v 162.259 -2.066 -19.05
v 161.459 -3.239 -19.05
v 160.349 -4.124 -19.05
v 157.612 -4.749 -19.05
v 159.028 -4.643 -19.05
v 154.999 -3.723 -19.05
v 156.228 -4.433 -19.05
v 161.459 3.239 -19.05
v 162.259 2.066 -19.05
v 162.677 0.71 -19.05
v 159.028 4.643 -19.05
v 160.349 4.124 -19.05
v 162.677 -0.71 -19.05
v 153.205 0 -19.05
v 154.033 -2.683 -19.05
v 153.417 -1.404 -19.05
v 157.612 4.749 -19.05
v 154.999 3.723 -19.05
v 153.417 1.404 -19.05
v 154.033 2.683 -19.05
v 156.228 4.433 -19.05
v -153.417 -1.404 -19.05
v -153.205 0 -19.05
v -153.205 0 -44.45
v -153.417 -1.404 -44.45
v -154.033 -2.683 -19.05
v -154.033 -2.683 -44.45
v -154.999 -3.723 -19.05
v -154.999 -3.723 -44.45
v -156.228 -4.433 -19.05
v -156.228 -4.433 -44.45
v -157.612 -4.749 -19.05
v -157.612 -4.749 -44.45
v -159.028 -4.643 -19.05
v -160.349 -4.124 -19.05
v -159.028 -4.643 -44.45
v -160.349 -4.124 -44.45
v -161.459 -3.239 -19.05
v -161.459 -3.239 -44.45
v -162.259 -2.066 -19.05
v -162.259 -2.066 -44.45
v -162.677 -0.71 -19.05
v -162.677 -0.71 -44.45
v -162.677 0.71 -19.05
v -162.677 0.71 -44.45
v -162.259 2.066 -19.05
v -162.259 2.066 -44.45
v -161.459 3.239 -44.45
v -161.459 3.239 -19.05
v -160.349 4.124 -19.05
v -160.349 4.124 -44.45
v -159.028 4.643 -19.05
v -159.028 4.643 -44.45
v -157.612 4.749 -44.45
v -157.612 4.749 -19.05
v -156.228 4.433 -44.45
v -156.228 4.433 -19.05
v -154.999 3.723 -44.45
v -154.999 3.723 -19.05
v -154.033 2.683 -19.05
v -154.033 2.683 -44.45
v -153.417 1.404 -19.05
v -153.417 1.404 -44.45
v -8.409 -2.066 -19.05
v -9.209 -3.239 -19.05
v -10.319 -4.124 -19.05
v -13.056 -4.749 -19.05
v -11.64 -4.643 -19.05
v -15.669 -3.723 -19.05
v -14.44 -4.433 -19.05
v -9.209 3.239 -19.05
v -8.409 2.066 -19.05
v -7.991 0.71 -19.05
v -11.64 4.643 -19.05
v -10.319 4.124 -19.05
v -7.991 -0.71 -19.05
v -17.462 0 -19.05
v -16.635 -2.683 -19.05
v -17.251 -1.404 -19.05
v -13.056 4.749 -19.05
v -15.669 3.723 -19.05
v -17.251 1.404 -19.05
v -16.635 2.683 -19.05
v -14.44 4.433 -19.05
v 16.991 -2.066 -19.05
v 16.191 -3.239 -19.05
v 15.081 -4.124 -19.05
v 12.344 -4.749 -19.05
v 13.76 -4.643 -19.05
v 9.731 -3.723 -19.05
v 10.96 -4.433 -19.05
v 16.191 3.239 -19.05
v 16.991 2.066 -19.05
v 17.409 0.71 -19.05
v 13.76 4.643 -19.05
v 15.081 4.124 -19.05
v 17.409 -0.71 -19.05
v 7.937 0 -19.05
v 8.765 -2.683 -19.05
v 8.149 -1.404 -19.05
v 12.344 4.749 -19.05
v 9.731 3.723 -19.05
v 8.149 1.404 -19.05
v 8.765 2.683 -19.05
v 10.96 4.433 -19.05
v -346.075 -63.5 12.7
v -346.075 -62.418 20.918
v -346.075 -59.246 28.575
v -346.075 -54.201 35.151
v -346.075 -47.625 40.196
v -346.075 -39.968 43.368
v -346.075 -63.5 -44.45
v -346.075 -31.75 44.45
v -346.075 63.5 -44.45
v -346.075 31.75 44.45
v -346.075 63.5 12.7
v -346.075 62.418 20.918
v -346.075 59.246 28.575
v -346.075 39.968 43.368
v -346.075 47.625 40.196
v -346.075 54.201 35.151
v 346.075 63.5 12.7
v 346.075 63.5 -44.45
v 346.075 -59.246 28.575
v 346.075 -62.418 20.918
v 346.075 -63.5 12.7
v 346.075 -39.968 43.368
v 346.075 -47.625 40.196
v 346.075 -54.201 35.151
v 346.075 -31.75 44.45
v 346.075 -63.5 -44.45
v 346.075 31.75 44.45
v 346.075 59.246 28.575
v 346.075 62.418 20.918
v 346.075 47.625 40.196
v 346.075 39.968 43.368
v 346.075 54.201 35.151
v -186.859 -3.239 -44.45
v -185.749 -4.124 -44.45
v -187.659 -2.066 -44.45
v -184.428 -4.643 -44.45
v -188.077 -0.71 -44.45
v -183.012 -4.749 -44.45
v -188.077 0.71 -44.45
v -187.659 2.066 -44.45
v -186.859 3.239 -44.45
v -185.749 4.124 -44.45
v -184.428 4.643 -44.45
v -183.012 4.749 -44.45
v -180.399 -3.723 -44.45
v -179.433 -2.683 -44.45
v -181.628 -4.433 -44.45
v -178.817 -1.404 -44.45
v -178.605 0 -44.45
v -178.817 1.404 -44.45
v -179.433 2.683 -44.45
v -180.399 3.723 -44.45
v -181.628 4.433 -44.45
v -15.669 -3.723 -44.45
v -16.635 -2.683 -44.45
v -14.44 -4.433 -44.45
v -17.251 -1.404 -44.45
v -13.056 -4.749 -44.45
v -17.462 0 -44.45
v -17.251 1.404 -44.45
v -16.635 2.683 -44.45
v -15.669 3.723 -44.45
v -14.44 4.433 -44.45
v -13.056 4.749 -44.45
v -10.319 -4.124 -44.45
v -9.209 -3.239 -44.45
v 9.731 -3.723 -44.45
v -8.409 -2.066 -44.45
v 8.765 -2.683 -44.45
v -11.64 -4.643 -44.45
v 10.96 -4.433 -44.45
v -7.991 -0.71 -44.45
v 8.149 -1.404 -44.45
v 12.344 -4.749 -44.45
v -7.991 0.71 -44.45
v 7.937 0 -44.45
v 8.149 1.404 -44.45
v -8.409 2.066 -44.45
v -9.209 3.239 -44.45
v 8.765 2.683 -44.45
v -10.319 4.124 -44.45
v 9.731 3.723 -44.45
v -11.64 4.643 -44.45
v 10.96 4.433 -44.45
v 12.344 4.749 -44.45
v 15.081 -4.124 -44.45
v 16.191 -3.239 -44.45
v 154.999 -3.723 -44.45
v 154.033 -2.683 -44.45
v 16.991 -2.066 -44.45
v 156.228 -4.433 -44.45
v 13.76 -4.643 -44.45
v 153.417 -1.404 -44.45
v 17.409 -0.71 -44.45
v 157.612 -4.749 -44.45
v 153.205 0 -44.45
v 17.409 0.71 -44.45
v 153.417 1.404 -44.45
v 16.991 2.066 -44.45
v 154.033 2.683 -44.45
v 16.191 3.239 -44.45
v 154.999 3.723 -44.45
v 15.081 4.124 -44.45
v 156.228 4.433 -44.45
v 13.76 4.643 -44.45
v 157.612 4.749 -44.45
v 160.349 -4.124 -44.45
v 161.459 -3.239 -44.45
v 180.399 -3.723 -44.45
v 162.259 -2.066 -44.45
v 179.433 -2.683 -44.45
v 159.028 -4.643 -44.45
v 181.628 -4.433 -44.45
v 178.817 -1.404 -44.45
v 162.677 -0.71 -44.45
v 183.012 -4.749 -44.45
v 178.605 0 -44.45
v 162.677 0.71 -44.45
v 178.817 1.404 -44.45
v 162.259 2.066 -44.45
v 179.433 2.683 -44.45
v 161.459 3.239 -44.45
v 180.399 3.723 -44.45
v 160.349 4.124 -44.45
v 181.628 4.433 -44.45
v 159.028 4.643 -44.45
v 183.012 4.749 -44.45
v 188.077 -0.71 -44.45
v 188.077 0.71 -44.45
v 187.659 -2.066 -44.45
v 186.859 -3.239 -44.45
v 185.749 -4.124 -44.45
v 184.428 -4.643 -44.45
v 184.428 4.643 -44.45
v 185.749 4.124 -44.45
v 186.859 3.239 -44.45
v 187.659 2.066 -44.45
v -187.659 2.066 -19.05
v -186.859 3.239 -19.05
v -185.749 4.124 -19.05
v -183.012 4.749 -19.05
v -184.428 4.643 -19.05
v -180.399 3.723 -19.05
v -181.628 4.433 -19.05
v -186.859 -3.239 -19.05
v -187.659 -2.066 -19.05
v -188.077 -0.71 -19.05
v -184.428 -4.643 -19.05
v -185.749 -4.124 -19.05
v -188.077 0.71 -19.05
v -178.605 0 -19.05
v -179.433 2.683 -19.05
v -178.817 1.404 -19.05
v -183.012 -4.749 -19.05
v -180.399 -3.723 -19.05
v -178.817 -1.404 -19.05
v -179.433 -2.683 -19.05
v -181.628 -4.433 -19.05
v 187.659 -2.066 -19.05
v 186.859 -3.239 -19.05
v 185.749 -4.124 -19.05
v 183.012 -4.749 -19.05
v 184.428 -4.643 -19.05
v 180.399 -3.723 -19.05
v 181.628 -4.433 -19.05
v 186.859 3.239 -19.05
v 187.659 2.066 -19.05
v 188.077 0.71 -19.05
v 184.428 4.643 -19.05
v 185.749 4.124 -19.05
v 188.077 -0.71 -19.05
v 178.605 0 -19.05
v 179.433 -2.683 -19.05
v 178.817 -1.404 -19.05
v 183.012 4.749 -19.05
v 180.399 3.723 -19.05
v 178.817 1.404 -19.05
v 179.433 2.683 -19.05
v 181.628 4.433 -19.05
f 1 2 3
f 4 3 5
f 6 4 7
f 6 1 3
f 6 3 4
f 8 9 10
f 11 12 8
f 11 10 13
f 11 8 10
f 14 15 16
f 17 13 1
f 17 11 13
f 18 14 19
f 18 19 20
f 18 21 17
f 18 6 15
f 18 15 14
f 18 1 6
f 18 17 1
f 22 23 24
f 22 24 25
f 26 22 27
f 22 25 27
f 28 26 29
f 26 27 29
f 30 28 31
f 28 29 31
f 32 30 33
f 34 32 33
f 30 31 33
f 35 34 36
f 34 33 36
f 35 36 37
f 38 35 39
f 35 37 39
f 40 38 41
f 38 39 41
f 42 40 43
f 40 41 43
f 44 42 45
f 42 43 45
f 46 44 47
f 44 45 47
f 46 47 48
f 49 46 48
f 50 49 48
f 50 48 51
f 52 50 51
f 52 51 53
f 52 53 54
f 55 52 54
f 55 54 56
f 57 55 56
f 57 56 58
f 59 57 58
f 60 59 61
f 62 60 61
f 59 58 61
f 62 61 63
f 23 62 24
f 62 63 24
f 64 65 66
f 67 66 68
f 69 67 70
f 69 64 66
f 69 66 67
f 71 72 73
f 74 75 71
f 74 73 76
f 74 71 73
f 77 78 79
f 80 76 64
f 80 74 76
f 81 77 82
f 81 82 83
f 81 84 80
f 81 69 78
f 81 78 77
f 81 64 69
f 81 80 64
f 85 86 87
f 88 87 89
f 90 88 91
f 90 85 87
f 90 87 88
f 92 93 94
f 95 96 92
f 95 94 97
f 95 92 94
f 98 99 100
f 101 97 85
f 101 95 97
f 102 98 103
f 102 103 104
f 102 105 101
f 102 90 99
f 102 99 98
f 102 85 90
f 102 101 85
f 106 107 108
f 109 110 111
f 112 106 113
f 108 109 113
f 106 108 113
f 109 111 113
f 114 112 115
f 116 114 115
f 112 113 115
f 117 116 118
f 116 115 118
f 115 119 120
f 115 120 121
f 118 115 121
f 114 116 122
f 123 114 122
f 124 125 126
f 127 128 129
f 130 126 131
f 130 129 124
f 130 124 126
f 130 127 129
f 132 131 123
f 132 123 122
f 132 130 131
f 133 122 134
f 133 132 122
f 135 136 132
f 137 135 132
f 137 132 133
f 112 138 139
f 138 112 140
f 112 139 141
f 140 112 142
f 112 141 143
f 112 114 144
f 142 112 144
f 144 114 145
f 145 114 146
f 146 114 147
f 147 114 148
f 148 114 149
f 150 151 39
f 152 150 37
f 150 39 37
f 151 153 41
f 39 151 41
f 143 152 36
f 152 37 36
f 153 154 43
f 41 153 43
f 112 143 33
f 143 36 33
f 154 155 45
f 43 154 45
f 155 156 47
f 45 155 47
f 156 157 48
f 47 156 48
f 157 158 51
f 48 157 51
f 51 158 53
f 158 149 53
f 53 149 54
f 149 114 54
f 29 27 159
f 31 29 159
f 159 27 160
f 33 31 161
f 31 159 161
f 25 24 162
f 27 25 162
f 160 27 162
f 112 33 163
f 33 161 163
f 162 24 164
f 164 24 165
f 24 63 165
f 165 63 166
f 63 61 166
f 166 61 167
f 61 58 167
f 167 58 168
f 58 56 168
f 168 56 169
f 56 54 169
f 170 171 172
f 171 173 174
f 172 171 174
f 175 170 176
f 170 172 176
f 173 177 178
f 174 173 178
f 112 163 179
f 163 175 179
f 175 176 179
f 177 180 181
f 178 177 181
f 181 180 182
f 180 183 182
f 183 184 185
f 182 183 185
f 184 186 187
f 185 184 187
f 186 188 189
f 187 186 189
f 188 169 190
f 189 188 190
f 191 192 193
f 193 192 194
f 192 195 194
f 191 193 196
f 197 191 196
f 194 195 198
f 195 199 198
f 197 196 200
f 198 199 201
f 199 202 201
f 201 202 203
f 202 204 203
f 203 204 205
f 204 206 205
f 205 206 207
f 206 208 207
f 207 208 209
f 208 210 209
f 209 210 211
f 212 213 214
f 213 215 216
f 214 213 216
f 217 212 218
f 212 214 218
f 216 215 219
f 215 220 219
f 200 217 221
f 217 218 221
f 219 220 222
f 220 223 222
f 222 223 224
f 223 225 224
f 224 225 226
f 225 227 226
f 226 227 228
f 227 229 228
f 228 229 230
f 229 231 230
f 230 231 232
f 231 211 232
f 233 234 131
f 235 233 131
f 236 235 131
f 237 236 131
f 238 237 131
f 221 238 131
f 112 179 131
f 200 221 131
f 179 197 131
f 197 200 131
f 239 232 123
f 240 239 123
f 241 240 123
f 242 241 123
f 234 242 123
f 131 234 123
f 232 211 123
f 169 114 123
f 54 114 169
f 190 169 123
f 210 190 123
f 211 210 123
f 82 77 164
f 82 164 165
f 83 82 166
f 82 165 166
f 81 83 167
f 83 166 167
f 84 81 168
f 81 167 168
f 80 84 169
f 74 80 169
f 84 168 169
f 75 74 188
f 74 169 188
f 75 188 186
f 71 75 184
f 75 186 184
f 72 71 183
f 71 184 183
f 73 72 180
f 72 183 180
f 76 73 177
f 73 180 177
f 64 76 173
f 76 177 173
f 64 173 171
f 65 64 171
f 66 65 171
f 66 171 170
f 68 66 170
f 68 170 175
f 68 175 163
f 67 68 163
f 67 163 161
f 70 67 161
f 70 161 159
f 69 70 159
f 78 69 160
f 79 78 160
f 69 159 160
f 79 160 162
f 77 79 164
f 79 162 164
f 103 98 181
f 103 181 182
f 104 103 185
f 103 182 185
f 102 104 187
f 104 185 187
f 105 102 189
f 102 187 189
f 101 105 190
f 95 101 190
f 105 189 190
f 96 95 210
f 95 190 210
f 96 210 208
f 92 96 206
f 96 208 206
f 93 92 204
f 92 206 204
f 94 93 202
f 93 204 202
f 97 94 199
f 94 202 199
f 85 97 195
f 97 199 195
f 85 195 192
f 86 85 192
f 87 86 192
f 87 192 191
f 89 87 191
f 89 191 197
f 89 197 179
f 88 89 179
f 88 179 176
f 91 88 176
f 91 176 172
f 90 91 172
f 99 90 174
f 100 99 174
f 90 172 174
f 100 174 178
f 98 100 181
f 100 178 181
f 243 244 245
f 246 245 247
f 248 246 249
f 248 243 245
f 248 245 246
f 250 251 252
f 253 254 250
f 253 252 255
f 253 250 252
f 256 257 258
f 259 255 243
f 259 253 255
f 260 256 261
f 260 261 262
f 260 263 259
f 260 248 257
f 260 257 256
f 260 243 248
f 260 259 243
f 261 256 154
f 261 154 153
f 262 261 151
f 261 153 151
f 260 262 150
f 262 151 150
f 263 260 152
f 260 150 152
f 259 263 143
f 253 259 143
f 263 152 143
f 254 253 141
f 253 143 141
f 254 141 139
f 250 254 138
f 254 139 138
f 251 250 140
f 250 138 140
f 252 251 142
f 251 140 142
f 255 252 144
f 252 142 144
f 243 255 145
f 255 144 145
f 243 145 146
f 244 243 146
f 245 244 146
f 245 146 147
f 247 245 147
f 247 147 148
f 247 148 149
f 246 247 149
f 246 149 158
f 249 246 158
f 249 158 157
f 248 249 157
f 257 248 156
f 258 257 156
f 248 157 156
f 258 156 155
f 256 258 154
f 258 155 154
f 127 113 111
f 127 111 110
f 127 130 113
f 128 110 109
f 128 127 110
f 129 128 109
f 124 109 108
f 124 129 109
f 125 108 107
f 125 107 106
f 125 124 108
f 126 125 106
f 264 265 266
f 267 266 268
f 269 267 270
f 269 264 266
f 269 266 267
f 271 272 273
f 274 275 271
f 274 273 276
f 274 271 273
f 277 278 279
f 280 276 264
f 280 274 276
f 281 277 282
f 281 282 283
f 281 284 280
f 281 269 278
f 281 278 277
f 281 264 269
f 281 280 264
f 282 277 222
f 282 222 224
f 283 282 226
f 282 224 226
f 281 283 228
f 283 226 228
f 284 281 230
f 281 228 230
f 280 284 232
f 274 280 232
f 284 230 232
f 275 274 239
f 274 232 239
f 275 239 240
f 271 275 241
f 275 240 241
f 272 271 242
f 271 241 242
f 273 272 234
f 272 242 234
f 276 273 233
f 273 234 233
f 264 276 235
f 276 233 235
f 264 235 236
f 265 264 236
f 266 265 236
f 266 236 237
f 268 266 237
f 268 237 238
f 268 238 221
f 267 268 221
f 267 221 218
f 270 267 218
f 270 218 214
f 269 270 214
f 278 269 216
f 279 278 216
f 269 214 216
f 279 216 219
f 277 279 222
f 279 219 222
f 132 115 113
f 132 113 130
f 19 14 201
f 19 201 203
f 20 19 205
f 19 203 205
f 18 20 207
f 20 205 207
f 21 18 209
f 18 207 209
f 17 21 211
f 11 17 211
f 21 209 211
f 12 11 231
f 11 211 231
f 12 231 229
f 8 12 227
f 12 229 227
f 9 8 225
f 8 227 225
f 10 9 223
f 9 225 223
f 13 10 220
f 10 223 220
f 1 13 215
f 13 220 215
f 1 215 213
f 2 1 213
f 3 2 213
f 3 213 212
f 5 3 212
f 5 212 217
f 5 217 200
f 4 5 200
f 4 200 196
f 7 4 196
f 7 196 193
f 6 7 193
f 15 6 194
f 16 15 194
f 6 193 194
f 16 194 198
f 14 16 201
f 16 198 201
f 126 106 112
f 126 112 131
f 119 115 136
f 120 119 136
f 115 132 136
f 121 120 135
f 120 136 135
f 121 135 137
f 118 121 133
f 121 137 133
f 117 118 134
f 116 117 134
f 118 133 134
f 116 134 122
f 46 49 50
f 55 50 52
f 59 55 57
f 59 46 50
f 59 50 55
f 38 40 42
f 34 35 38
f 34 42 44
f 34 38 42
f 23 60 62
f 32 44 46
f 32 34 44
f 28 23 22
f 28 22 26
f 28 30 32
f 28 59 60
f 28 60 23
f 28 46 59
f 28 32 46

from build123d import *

# Parameters (mm, degrees)
SKETCH1_W           = 692.15
SKETCH1_H           = 127
BOSS_EXTRUDE1_DEPTH = 44.45
FILLET1_R           = 31.75
SKETCH2_R           = 4.7625
CUT_EXTRUDE1_DEPTH  = 25.4


with BuildPart() as part:
    # Sketch1 → Boss-Extrude1 (new, symmetric)
    with BuildSketch(Plane.XY):
        Rectangle(SKETCH1_W, SKETCH1_H)
    extrude(amount=BOSS_EXTRUDE1_DEPTH, both=True)

    # Fillet1
    fillet1_edges = [part.edges().sort_by_distance(p)[0] for p in [
        (0, -63.5, 44.45),
        (0, 63.5, 44.45),
    ]]
    fillet(fillet1_edges, radius=FILLET1_R)

    # Sketch2 → Cut-Extrude1 (cut)
    with BuildSketch(Plane(origin=(0, 0, -44.45), x_dir=(-1, 0, 0), z_dir=(0, 0, -1))):
        with Locations(Location((157.967933997, 0, 0), (0, 0, 180))):
            Circle(SKETCH2_R)
        with Locations(Location((183.367933997, 0, 0), (0, 0, 180))):
            Circle(SKETCH2_R)
        with Locations((12.7, 0)):
            Circle(SKETCH2_R)
        with Locations((-12.7, 0)):
            Circle(SKETCH2_R)
        with Locations((-157.967933997, 0)):
            Circle(SKETCH2_R)
        with Locations((-183.367933997, 0)):
            Circle(SKETCH2_R)
    extrude(amount=-CUT_EXTRUDE1_DEPTH, mode=Mode.SUBTRACT)


solid = part.part
